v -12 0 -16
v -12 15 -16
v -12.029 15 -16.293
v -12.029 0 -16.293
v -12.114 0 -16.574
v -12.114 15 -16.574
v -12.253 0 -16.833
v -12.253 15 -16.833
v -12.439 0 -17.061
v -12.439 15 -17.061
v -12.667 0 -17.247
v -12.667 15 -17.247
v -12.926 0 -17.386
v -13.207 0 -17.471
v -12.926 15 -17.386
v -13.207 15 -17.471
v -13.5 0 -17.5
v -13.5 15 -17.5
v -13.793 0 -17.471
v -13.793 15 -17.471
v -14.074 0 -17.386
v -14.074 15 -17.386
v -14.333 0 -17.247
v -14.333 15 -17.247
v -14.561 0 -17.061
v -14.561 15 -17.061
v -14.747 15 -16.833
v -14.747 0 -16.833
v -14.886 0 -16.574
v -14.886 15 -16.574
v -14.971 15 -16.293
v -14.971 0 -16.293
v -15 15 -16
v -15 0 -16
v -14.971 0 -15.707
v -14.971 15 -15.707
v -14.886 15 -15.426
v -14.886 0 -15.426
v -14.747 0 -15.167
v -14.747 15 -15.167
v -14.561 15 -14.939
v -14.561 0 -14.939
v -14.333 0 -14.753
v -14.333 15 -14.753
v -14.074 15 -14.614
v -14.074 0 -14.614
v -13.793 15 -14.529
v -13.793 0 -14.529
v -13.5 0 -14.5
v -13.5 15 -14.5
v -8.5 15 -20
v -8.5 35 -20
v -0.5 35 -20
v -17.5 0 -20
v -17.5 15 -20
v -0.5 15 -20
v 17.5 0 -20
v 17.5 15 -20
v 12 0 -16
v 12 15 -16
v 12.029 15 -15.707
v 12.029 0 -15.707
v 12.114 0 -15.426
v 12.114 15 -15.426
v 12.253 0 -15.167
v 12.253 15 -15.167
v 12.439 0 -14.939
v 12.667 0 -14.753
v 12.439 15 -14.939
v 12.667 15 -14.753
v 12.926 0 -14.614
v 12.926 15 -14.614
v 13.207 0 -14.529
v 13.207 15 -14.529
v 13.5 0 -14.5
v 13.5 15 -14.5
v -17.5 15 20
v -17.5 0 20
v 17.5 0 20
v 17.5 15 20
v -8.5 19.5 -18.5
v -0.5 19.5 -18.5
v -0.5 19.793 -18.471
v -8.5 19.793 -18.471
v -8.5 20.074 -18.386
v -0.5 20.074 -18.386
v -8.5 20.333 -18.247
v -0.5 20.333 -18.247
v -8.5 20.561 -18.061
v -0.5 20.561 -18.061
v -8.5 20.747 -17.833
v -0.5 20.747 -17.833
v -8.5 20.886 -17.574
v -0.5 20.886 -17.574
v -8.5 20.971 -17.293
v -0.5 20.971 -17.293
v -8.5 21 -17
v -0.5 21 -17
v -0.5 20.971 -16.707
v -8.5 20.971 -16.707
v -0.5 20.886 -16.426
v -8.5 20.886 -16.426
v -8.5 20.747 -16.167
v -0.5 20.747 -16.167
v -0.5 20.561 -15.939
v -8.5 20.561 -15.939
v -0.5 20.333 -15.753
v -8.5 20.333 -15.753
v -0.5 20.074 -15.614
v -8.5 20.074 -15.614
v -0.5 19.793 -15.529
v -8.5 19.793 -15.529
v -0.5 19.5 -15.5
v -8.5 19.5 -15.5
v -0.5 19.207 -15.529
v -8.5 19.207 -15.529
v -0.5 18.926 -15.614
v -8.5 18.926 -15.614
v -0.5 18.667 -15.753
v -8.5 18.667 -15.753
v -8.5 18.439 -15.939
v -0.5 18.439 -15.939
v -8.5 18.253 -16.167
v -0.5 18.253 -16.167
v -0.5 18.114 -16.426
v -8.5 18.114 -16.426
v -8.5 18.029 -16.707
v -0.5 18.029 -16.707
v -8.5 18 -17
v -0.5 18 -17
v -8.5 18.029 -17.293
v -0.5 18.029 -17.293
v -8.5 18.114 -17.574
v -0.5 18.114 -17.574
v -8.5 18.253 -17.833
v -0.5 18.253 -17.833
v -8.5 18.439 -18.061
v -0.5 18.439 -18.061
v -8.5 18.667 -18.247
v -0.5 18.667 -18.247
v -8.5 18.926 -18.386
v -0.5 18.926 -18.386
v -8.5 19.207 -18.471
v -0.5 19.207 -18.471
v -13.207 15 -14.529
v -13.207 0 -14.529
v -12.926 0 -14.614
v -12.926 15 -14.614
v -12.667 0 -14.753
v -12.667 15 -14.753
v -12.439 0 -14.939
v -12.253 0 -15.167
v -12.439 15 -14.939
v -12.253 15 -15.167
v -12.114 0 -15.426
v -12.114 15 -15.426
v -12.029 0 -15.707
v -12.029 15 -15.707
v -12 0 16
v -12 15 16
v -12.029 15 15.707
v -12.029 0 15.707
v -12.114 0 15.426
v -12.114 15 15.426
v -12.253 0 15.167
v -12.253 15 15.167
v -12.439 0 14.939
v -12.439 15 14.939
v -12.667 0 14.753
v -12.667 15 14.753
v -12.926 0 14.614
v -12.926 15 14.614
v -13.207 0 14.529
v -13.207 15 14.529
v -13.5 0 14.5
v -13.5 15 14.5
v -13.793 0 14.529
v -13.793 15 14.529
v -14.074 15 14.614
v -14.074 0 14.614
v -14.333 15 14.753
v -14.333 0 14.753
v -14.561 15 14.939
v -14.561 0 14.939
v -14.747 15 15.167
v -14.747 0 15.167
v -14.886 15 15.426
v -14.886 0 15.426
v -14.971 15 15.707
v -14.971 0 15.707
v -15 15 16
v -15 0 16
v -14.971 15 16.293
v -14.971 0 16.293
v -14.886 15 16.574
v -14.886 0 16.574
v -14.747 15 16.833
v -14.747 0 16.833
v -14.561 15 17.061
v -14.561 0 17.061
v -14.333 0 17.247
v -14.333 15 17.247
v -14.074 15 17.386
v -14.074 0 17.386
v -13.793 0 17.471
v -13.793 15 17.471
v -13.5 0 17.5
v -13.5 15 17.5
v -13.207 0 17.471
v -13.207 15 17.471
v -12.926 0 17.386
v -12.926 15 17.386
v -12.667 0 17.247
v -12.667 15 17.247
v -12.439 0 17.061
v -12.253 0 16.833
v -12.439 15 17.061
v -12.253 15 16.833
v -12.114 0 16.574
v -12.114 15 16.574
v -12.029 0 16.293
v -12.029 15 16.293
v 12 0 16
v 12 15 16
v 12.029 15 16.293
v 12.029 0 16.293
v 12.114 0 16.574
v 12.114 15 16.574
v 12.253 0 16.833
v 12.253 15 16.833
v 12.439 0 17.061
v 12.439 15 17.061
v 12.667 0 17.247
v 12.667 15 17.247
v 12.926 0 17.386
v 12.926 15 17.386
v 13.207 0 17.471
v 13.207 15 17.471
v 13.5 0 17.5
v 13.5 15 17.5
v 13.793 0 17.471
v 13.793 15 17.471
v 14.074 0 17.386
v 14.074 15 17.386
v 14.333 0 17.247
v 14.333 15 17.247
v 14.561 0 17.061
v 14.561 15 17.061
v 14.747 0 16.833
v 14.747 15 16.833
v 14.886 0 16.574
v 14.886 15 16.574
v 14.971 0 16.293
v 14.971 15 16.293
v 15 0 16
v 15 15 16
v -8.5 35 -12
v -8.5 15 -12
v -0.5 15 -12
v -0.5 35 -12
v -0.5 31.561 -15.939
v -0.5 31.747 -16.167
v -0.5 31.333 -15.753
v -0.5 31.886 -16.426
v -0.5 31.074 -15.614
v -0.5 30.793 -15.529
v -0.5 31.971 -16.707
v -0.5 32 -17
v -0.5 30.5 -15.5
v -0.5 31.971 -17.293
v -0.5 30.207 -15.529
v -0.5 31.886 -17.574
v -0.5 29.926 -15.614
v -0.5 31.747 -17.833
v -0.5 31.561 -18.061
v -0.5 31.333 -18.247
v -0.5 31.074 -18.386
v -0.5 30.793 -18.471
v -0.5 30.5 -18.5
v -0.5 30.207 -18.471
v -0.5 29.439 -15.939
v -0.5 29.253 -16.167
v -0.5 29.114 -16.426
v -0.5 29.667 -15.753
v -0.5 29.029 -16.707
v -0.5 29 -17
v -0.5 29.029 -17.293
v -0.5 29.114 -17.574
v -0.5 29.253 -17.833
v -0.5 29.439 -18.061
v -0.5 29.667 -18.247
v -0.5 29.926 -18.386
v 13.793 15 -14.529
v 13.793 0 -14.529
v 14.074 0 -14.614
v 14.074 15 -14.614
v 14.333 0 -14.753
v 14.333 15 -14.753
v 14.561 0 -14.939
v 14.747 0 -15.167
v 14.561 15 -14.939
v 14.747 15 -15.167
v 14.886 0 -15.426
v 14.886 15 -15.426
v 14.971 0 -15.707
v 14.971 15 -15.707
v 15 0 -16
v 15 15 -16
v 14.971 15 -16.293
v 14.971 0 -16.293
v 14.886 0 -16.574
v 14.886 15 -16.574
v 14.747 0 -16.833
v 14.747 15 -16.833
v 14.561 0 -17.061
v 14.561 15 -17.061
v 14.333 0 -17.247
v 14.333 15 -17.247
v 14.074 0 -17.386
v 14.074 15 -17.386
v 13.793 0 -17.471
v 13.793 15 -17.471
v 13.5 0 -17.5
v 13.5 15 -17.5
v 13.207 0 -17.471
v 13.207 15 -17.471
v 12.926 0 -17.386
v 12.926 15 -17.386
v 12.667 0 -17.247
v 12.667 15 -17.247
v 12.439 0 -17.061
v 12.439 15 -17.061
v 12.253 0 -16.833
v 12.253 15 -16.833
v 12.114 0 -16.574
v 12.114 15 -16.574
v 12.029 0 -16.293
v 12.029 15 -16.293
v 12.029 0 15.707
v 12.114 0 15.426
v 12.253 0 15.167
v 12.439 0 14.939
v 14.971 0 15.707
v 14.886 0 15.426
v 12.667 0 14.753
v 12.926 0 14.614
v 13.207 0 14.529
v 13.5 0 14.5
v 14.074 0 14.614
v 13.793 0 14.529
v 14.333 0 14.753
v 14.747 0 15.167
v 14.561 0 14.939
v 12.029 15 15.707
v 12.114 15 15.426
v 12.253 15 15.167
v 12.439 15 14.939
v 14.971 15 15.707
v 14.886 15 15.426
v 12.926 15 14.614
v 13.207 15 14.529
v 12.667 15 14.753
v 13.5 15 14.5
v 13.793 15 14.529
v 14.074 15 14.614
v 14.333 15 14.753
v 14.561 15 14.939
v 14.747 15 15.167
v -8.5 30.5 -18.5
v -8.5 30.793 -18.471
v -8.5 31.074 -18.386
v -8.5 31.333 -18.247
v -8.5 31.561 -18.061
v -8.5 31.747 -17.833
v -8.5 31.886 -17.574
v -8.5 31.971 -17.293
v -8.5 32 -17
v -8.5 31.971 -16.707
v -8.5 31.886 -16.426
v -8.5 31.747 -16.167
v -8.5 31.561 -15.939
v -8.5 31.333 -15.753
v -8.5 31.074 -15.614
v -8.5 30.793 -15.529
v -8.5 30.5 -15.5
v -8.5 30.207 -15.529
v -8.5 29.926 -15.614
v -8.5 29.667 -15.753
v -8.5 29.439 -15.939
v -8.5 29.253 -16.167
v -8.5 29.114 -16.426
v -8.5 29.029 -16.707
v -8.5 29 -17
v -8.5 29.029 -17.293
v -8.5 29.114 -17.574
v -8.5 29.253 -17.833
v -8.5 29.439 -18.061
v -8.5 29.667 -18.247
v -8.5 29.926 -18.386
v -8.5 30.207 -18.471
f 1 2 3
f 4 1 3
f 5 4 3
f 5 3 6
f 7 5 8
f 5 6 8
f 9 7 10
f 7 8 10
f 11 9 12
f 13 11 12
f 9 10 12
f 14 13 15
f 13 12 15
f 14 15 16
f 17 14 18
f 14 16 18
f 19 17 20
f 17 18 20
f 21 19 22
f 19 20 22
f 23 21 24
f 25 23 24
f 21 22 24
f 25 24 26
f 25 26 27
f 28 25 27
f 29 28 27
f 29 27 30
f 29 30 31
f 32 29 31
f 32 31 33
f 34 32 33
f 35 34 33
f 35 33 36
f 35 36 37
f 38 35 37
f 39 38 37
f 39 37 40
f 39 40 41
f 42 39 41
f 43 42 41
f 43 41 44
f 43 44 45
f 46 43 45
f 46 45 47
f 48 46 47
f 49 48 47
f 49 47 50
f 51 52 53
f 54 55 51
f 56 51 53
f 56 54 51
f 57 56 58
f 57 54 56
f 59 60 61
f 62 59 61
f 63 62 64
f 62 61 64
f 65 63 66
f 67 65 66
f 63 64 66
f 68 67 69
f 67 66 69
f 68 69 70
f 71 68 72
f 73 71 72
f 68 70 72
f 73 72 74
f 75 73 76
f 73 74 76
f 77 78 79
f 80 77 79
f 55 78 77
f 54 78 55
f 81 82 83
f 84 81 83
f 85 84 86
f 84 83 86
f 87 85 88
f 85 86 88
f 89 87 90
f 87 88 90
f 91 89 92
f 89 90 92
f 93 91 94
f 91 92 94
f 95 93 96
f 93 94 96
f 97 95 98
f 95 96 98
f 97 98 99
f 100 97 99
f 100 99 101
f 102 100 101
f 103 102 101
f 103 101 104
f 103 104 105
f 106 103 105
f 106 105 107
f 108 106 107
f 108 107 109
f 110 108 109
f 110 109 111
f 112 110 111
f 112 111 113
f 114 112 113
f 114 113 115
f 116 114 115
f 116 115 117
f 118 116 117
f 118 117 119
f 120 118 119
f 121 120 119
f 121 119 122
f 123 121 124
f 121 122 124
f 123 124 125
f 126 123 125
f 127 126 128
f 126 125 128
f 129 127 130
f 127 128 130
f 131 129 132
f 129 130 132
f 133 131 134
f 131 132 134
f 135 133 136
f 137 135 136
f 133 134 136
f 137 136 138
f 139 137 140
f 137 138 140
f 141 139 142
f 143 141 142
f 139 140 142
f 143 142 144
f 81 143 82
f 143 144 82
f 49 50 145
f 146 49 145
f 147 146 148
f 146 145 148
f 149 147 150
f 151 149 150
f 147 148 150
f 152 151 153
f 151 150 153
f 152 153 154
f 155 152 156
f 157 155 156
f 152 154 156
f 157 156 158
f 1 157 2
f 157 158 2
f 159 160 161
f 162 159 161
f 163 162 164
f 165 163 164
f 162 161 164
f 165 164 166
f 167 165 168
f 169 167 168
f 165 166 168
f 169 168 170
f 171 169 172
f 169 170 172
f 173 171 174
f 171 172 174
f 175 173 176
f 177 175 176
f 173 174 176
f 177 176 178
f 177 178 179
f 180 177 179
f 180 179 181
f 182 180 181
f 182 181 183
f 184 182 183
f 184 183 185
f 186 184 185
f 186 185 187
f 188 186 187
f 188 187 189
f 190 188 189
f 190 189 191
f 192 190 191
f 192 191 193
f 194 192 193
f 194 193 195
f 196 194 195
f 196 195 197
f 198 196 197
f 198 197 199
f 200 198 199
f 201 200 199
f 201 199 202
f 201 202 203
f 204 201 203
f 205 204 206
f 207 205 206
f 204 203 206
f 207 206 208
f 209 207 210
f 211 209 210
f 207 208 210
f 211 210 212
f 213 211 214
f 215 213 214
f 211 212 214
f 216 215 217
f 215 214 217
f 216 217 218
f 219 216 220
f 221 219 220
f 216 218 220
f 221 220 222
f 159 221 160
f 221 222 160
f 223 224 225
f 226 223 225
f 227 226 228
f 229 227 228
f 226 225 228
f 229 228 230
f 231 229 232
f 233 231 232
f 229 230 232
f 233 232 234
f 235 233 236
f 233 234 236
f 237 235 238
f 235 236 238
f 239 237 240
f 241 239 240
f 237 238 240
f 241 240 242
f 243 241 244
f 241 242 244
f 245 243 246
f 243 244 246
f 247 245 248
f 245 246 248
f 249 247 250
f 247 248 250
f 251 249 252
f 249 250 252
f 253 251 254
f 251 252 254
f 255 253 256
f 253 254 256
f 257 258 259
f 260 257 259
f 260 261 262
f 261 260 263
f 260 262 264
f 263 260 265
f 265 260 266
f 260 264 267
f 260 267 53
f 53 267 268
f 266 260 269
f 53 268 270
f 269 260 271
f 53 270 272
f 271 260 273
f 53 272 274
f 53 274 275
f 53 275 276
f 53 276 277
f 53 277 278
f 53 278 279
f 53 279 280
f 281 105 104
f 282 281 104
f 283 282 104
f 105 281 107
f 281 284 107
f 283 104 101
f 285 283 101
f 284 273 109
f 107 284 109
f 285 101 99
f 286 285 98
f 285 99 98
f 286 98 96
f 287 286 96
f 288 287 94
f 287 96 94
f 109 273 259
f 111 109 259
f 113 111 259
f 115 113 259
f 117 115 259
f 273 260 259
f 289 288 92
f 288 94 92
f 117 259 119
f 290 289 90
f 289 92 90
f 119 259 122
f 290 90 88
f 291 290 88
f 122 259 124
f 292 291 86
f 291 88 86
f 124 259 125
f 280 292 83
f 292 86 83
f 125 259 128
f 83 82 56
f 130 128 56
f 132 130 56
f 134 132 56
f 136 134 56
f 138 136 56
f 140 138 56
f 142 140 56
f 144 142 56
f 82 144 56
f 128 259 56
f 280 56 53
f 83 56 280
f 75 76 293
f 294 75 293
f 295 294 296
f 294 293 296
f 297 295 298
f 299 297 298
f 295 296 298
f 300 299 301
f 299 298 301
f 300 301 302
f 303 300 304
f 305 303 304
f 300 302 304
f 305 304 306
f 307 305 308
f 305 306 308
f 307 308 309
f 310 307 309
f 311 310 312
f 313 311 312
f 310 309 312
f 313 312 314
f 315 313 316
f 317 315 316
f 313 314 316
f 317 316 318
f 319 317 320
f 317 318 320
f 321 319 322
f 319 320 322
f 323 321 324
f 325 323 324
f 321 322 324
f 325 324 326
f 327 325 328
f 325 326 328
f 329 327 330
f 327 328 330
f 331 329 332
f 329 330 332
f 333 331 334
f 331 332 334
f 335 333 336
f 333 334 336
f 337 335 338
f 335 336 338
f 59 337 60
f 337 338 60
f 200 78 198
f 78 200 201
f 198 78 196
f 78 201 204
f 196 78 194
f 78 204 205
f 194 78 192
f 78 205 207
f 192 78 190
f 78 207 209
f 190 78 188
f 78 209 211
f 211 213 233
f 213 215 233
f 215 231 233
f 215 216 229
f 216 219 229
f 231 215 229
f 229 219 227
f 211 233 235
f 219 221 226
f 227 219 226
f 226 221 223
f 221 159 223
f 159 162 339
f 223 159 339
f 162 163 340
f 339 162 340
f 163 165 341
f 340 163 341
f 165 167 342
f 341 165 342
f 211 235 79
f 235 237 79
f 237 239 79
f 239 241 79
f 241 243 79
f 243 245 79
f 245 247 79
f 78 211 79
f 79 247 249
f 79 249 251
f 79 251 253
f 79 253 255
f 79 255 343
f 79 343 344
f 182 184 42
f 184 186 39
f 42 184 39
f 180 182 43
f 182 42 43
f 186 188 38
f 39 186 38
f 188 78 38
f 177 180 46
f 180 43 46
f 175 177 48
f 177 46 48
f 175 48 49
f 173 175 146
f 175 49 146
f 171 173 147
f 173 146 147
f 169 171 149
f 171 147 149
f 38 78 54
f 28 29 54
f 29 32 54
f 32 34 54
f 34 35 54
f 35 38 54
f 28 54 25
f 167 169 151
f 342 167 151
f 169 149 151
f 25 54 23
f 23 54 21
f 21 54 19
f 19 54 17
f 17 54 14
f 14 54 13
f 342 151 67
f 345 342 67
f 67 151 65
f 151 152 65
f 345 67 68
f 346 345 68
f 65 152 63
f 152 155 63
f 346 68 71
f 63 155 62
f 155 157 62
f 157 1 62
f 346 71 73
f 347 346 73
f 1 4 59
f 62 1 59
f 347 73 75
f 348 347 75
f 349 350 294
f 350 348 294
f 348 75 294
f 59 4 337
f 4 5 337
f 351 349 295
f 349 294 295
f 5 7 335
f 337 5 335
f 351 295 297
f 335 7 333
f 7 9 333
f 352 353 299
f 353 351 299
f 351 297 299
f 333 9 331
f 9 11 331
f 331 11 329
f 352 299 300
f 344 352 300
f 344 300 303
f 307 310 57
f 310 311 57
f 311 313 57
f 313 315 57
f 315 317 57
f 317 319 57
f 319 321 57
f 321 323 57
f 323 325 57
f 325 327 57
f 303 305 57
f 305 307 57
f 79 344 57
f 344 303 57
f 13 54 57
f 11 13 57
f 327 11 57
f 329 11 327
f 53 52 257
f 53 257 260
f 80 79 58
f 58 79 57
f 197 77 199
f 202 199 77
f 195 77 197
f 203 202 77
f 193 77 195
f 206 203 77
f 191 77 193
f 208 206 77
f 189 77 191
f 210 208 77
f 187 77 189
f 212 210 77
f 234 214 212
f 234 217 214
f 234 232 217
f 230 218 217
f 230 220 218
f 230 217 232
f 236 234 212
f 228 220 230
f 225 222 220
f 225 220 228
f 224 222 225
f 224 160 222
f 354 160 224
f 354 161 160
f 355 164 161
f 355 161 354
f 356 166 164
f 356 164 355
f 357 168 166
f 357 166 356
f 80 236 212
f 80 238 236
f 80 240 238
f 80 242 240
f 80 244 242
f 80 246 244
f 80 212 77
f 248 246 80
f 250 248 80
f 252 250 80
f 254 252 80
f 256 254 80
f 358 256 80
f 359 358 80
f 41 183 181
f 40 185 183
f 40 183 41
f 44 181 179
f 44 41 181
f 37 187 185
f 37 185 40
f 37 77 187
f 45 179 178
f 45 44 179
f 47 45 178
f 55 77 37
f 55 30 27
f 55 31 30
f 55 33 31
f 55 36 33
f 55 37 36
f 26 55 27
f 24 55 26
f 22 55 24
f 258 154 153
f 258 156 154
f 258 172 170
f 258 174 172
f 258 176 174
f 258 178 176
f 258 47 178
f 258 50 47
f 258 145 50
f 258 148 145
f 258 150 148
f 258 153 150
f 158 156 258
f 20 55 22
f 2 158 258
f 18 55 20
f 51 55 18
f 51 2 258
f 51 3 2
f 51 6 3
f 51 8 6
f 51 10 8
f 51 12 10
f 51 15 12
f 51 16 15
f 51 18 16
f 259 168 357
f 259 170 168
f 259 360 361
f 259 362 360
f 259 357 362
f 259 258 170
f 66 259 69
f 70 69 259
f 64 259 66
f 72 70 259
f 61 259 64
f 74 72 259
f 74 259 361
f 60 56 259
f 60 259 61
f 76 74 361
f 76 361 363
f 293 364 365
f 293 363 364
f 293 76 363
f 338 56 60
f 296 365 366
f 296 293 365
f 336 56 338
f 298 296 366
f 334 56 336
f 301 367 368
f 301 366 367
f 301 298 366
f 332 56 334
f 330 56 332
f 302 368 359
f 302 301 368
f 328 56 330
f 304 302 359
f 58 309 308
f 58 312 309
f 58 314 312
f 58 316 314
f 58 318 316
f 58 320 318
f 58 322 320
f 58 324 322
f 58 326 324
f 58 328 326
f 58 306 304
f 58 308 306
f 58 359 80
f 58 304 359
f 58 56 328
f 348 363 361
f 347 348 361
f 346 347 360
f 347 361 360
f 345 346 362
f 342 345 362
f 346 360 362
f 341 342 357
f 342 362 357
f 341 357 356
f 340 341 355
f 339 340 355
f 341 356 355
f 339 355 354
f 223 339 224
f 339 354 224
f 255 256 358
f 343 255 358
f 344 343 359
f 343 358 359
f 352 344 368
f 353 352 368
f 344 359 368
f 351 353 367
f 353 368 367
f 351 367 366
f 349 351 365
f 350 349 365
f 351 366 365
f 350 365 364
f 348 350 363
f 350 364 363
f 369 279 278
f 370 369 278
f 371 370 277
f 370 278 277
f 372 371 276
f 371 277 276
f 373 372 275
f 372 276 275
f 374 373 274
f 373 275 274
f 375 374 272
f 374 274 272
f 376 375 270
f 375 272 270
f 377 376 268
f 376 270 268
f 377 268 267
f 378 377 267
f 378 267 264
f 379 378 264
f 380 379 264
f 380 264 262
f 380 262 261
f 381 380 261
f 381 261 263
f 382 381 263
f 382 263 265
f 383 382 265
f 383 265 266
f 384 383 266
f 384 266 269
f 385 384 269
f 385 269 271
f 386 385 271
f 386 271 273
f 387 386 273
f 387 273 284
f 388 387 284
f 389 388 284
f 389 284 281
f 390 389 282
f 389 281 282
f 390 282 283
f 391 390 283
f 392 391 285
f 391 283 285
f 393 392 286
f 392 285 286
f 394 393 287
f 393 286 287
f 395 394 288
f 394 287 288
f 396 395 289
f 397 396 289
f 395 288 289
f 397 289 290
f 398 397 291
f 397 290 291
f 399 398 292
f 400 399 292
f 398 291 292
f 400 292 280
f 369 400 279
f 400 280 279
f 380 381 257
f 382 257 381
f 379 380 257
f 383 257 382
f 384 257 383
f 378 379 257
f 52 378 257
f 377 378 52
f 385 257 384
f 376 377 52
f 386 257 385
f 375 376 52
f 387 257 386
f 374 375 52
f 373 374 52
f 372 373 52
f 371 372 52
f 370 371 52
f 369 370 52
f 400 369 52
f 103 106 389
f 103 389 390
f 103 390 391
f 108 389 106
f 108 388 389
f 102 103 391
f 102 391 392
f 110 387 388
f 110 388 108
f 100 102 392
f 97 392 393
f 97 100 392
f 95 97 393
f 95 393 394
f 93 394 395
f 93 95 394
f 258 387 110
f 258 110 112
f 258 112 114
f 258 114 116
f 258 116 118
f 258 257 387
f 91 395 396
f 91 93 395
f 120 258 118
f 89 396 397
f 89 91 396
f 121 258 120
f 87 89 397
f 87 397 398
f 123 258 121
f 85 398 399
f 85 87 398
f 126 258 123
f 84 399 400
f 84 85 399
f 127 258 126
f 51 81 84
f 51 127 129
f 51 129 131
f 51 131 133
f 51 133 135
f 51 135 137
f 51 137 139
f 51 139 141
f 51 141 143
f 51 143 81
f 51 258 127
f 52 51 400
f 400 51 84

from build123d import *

# Parameters (mm, degrees)
SKETCH_1_W          = 35
SKETCH_1_H          = 40
EXTRUDE_1_DEPTH     = 15
SKETCH_4_R          = 1.5
CUT_EXTRUDE_1_DEPTH = 25
SKETCH_5_W          = 8
SKETCH_5_H          = 8
EXTRUDE_2_DEPTH     = 20
SKETCH_6_R          = 1.5
CUT_EXTRUDE_2_DEPTH = 20


with BuildPart() as part:
    # Эскиз1 → Бобышка-Вытянуть1 (new body)
    with BuildSketch(Plane(origin=(0, 0, 0), x_dir=(1, 0, 0), z_dir=(0, 1, 0))):
        Rectangle(SKETCH_1_W, SKETCH_1_H)
    extrude(amount=EXTRUDE_1_DEPTH)

    # Эскиз4 → Вырез-Вытянуть1 (cut)
    with BuildSketch(Plane(origin=(0, 15, 0), x_dir=(1, 0, 0), z_dir=(0, 1, 0))):
        with BuildLine():
            ThreePointArc((-12, 16), (-14.560660172, 17.060660172), (-13.5, 14.5))
            Line((-13.5, 14.5), (-13.5, 16))
            Line((-13.5, 16), (-12, 16))
        make_face()
        with BuildLine():
            Line((-13.5, 16), (-13.5, 14.5))
            ThreePointArc((-13.5, 14.5), (-12.439339828, 14.939339828), (-12, 16))
            Line((-12, 16), (-13.5, 16))
        make_face()
        with BuildLine():
            ThreePointArc((15, -16), (14.560660172, -14.939339828), (13.5, -14.5))
            Line((13.5, -14.5), (13.5, -16))
            Line((13.5, -16), (12, -16))
            ThreePointArc((12, -16), (13.5, -17.5), (15, -16))
        make_face()
        with BuildLine():
            Line((13.5, -16), (13.5, -14.5))
            ThreePointArc((13.5, -14.5), (12.439339828, -14.939339828), (12, -16))
            Line((12, -16), (13.5, -16))
        make_face()
        with BuildLine():
            ThreePointArc((12, 16), (12.439339828, 14.939339828), (13.5, 14.5))
            Line((13.5, 14.5), (13.5, 16))
            Line((13.5, 16), (12, 16))
        make_face()
        with BuildLine():
            Line((13.5, 16), (13.5, 14.5))
            ThreePointArc((13.5, 14.5), (14.560660172, 14.939339828), (15, 16))
            ThreePointArc((15, 16), (13.5, 17.5), (12, 16))
            Line((12, 16), (13.5, 16))
        make_face()
        with Locations((-13.5, -16)):
            Circle(SKETCH_4_R)
    extrude(amount=-CUT_EXTRUDE_1_DEPTH, mode=Mode.SUBTRACT)

    # Эскиз5 → Бобышка-Вытянуть2 (add)
    with BuildSketch(Plane(origin=(0, 15, 0), x_dir=(1, 0, 0), z_dir=(0, 1, 0))):
        with Locations((-4.5, 16)):
            Rectangle(SKETCH_5_W, SKETCH_5_H)
    extrude(amount=EXTRUDE_2_DEPTH)

    # Эскиз6 → Вырез-Вытянуть2 (cut)
    with BuildSketch(Plane(origin=(-0.5, 0, 0), x_dir=(0, 0, -1), z_dir=(1, 0, 0))):
        with Locations((17, 30.5)):
            Circle(SKETCH_6_R)
        with Locations((17, 19.5)):
            Circle(SKETCH_6_R)
    extrude(amount=-CUT_EXTRUDE_2_DEPTH, mode=Mode.SUBTRACT)


solid = part.part
